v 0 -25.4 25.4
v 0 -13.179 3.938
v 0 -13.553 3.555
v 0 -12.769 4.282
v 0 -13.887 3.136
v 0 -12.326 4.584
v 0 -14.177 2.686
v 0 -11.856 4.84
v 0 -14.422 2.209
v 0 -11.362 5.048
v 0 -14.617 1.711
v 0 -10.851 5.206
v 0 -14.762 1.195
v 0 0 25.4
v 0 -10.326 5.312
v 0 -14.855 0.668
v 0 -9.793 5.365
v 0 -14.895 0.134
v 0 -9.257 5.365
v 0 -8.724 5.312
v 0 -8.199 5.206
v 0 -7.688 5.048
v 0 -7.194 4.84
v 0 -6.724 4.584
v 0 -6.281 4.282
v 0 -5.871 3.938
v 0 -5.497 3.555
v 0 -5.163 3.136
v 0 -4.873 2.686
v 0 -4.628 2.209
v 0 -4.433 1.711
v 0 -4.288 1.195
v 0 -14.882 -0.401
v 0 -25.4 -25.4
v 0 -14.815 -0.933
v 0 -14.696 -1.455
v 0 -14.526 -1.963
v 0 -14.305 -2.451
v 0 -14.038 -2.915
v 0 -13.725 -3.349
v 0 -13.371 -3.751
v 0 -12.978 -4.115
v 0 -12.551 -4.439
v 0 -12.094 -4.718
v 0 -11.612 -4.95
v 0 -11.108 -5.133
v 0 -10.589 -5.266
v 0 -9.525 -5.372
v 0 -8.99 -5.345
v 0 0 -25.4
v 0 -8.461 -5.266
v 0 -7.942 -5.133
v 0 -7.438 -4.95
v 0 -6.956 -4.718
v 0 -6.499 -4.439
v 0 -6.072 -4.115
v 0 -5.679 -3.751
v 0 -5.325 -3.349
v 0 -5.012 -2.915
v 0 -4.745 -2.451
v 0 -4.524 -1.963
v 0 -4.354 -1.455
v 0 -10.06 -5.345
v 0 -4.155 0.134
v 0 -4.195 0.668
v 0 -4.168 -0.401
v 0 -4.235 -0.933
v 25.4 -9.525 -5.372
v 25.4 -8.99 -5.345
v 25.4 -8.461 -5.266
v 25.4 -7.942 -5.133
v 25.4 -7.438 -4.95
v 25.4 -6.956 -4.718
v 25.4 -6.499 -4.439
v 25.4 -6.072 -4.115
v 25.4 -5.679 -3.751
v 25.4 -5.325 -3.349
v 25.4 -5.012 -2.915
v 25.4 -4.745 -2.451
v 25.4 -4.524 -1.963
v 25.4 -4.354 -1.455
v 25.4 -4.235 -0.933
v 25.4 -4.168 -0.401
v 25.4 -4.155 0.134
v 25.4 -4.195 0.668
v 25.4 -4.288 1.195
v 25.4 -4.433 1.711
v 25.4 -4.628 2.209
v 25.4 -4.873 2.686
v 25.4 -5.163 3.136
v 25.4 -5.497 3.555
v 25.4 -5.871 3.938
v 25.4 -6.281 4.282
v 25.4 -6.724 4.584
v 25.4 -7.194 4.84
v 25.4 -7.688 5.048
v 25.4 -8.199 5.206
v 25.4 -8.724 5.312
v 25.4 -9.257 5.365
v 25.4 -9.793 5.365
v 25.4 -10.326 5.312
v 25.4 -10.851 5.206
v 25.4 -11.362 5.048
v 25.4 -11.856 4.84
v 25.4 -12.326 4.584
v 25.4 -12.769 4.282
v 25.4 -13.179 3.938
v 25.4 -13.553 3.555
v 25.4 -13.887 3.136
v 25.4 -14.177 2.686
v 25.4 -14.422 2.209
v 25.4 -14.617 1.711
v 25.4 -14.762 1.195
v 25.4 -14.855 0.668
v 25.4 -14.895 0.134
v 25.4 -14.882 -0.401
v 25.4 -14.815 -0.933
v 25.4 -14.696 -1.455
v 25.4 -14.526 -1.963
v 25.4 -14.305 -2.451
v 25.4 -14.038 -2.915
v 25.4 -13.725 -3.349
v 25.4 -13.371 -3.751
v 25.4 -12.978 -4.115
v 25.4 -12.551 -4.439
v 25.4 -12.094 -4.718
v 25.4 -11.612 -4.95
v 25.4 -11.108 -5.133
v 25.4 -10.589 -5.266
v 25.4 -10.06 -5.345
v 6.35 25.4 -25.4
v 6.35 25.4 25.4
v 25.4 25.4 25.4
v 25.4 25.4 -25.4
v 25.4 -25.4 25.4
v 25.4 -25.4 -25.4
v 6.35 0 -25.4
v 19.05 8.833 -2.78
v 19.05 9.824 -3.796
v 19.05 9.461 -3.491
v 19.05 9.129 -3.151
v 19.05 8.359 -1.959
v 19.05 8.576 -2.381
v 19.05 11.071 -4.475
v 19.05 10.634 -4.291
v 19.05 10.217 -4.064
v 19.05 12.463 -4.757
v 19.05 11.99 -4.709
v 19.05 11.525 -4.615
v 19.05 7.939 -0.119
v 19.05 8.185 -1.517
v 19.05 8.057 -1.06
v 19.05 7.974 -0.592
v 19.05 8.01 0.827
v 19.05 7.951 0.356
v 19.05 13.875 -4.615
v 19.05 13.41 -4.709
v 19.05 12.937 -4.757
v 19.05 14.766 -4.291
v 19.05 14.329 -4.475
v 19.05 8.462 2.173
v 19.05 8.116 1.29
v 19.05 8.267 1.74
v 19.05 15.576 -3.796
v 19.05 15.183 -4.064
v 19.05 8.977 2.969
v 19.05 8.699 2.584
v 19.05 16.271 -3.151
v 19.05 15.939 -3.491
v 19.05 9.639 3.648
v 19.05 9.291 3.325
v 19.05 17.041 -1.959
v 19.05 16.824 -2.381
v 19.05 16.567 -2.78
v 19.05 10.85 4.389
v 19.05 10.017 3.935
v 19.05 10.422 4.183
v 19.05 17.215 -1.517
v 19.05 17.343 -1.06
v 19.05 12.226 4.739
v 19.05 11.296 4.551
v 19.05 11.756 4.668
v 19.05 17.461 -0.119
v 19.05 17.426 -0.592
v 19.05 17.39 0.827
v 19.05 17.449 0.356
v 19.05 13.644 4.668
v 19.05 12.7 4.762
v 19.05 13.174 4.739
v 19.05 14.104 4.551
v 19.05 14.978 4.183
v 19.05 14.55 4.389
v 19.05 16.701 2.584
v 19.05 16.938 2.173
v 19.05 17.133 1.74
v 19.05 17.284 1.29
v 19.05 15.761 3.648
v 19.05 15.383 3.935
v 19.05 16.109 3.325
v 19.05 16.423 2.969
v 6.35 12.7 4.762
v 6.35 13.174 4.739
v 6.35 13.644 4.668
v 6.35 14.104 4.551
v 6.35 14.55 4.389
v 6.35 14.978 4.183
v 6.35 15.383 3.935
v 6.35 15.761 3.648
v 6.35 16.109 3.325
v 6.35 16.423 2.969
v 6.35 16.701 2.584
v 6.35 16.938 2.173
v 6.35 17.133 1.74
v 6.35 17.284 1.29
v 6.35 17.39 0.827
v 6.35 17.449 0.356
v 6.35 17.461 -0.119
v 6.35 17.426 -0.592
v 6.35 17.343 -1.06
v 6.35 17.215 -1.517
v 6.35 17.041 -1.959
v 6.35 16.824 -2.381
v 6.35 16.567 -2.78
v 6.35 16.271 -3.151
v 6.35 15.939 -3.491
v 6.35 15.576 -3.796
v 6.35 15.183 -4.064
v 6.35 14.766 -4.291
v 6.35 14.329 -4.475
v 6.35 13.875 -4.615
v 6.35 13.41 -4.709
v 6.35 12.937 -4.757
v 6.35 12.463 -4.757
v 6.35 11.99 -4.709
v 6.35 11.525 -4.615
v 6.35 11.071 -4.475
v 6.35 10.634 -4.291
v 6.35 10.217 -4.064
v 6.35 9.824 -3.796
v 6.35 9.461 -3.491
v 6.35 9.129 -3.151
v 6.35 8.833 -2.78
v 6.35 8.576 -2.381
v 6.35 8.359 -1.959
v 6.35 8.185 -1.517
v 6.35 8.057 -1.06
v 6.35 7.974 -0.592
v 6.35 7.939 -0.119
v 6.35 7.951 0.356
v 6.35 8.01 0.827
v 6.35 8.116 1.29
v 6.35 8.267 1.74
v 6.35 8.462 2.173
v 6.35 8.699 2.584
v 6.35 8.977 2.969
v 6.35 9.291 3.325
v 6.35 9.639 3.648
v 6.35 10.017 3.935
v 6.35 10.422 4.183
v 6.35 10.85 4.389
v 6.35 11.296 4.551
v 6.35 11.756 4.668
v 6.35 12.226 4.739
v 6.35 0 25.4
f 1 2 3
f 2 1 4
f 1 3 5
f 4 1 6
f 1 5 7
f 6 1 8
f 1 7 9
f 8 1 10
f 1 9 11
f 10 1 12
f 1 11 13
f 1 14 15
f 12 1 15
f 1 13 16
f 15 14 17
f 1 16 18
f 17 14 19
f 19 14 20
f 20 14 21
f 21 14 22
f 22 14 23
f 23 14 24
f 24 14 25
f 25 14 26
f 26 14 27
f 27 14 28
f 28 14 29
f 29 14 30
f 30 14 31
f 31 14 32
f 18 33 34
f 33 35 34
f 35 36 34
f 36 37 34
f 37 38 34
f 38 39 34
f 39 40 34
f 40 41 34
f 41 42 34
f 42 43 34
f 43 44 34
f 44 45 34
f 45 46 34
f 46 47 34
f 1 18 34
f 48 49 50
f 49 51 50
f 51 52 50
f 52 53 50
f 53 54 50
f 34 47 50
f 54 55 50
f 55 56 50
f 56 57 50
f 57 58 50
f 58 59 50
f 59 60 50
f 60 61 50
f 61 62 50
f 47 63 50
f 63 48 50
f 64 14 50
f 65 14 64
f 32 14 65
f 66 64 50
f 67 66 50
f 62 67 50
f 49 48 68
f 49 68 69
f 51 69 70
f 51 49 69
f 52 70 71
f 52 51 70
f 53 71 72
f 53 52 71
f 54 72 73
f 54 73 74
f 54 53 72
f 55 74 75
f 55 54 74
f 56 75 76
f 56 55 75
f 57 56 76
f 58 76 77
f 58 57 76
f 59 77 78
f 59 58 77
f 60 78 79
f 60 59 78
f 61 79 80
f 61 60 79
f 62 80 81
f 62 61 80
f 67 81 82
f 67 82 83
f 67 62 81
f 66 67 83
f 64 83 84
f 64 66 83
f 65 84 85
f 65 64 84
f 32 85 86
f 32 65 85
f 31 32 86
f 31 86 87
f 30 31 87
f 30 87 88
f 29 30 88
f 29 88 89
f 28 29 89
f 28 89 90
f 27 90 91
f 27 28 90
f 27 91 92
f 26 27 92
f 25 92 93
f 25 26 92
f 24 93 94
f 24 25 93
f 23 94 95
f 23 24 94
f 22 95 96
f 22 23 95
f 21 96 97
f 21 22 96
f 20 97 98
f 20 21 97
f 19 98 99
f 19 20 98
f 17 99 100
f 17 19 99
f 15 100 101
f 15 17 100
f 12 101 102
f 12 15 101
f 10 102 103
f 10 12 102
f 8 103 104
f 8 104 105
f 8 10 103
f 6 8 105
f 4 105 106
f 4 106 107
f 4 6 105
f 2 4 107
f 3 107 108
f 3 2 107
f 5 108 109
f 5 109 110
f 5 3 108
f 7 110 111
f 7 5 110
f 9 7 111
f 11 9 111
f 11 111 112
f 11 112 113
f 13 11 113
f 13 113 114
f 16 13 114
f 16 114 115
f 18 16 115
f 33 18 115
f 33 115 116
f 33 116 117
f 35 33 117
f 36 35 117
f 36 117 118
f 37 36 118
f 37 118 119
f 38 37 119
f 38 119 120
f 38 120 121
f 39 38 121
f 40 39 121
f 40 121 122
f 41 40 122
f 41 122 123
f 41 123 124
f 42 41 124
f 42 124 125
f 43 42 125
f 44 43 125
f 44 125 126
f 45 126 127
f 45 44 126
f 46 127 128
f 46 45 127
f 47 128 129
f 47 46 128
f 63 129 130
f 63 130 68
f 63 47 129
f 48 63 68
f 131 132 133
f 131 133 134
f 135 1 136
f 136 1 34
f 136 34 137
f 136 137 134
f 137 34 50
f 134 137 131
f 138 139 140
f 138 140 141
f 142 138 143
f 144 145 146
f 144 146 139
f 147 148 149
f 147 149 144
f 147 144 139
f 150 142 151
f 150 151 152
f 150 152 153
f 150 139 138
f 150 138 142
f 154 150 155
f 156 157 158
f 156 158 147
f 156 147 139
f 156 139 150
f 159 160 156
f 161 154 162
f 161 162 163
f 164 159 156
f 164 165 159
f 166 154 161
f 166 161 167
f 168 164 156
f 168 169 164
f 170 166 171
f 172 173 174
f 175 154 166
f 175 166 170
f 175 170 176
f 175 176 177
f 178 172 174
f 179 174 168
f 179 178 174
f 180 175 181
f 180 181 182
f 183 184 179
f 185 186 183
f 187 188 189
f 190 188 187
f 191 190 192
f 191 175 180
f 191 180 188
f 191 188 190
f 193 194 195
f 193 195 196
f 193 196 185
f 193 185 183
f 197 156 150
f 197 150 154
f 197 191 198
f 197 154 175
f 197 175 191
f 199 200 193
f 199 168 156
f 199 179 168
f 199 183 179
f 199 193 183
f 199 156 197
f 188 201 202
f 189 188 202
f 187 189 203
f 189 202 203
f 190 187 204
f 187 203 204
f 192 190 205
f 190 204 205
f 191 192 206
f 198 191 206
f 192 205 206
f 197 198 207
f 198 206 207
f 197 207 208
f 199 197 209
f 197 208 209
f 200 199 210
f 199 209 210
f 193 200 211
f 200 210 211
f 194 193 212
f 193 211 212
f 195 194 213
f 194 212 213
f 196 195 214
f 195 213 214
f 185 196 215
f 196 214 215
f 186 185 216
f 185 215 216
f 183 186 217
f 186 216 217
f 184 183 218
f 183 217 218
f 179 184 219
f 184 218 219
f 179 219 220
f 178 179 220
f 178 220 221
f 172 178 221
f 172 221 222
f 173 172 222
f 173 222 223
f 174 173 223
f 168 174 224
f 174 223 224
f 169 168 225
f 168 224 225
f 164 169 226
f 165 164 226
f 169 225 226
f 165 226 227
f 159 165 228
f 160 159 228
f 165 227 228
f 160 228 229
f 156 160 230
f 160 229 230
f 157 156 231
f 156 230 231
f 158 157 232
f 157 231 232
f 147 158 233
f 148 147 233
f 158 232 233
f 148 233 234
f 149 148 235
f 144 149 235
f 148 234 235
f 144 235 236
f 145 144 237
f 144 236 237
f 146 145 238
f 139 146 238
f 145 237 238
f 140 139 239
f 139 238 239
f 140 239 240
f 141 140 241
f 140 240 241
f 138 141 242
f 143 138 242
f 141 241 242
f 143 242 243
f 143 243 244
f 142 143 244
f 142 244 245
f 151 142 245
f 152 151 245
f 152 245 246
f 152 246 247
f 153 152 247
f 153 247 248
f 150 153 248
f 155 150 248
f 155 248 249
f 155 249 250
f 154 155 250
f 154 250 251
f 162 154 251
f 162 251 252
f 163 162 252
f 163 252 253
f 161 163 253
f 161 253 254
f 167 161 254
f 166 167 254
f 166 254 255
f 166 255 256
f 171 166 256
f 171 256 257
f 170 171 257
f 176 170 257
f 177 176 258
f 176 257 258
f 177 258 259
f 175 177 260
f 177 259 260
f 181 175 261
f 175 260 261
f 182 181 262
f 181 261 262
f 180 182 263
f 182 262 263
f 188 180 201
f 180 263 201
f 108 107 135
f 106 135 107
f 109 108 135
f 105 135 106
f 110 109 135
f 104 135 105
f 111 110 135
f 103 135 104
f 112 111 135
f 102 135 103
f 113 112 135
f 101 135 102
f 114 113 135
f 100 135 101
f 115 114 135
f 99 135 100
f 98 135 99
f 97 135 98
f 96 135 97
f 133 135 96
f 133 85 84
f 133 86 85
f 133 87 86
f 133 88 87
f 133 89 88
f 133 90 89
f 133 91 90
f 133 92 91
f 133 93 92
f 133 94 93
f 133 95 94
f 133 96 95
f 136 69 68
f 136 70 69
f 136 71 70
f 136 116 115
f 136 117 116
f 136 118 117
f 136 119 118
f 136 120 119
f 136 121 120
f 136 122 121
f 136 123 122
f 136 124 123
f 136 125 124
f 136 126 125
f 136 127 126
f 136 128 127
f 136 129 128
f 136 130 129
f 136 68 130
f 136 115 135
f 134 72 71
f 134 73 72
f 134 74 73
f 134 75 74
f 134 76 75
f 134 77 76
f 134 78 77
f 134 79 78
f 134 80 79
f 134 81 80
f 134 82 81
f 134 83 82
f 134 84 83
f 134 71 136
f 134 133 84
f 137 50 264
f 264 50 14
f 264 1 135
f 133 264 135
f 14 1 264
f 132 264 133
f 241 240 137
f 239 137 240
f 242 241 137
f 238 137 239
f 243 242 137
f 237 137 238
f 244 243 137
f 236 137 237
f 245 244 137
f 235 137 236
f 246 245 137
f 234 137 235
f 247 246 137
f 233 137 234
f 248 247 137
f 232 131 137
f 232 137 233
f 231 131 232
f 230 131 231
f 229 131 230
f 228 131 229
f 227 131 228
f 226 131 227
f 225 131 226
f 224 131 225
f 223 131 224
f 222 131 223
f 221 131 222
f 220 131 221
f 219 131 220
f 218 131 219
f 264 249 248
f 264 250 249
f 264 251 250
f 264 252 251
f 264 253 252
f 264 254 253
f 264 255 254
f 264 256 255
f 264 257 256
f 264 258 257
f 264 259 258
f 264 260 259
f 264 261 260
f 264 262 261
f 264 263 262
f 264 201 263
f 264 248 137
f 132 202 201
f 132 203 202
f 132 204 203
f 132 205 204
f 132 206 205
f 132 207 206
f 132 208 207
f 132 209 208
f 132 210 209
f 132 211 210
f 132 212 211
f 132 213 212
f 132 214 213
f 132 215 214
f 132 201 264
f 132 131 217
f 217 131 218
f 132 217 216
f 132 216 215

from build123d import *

# Parameters (mm, degrees)
SKETCH1_W           = 50.8
SKETCH1_H           = 50.8
SKETCH1_R           = 5.3721
BOSS_EXTRUDE1_DEPTH = 25.4
SKETCH2_W           = 50.8
SKETCH2_H           = 25.4
CUT_EXTRUDE1_DEPTH  = 6.35
SKETCH3_R           = 4.7625
CUT_EXTRUDE2_DEPTH  = 12.7


with BuildPart() as part:
    # Sketch1 → Boss-Extrude1 (new body)
    with BuildSketch(Plane(origin=(0, 0, 0), x_dir=(0, 0, -1), z_dir=(1, 0, 0))):
        Rectangle(SKETCH1_W, SKETCH1_H)
        with Locations((0, -9.525)):
            Circle(SKETCH1_R, mode=Mode.SUBTRACT)
    extrude(amount=BOSS_EXTRUDE1_DEPTH)

    # Sketch2 → Cut-Extrude1 (cut)
    with BuildSketch(Plane.ZY):
        with Locations((0, 12.7)):
            Rectangle(SKETCH2_W, SKETCH2_H)
    extrude(amount=-CUT_EXTRUDE1_DEPTH, mode=Mode.SUBTRACT)

    # Sketch3 → Cut-Extrude2 (cut)
    with BuildSketch(Plane.ZY.offset(-6.35)):
        with Locations((0, 12.7)):
            Circle(SKETCH3_R)
    extrude(amount=-CUT_EXTRUDE2_DEPTH, mode=Mode.SUBTRACT)


solid = part.part
